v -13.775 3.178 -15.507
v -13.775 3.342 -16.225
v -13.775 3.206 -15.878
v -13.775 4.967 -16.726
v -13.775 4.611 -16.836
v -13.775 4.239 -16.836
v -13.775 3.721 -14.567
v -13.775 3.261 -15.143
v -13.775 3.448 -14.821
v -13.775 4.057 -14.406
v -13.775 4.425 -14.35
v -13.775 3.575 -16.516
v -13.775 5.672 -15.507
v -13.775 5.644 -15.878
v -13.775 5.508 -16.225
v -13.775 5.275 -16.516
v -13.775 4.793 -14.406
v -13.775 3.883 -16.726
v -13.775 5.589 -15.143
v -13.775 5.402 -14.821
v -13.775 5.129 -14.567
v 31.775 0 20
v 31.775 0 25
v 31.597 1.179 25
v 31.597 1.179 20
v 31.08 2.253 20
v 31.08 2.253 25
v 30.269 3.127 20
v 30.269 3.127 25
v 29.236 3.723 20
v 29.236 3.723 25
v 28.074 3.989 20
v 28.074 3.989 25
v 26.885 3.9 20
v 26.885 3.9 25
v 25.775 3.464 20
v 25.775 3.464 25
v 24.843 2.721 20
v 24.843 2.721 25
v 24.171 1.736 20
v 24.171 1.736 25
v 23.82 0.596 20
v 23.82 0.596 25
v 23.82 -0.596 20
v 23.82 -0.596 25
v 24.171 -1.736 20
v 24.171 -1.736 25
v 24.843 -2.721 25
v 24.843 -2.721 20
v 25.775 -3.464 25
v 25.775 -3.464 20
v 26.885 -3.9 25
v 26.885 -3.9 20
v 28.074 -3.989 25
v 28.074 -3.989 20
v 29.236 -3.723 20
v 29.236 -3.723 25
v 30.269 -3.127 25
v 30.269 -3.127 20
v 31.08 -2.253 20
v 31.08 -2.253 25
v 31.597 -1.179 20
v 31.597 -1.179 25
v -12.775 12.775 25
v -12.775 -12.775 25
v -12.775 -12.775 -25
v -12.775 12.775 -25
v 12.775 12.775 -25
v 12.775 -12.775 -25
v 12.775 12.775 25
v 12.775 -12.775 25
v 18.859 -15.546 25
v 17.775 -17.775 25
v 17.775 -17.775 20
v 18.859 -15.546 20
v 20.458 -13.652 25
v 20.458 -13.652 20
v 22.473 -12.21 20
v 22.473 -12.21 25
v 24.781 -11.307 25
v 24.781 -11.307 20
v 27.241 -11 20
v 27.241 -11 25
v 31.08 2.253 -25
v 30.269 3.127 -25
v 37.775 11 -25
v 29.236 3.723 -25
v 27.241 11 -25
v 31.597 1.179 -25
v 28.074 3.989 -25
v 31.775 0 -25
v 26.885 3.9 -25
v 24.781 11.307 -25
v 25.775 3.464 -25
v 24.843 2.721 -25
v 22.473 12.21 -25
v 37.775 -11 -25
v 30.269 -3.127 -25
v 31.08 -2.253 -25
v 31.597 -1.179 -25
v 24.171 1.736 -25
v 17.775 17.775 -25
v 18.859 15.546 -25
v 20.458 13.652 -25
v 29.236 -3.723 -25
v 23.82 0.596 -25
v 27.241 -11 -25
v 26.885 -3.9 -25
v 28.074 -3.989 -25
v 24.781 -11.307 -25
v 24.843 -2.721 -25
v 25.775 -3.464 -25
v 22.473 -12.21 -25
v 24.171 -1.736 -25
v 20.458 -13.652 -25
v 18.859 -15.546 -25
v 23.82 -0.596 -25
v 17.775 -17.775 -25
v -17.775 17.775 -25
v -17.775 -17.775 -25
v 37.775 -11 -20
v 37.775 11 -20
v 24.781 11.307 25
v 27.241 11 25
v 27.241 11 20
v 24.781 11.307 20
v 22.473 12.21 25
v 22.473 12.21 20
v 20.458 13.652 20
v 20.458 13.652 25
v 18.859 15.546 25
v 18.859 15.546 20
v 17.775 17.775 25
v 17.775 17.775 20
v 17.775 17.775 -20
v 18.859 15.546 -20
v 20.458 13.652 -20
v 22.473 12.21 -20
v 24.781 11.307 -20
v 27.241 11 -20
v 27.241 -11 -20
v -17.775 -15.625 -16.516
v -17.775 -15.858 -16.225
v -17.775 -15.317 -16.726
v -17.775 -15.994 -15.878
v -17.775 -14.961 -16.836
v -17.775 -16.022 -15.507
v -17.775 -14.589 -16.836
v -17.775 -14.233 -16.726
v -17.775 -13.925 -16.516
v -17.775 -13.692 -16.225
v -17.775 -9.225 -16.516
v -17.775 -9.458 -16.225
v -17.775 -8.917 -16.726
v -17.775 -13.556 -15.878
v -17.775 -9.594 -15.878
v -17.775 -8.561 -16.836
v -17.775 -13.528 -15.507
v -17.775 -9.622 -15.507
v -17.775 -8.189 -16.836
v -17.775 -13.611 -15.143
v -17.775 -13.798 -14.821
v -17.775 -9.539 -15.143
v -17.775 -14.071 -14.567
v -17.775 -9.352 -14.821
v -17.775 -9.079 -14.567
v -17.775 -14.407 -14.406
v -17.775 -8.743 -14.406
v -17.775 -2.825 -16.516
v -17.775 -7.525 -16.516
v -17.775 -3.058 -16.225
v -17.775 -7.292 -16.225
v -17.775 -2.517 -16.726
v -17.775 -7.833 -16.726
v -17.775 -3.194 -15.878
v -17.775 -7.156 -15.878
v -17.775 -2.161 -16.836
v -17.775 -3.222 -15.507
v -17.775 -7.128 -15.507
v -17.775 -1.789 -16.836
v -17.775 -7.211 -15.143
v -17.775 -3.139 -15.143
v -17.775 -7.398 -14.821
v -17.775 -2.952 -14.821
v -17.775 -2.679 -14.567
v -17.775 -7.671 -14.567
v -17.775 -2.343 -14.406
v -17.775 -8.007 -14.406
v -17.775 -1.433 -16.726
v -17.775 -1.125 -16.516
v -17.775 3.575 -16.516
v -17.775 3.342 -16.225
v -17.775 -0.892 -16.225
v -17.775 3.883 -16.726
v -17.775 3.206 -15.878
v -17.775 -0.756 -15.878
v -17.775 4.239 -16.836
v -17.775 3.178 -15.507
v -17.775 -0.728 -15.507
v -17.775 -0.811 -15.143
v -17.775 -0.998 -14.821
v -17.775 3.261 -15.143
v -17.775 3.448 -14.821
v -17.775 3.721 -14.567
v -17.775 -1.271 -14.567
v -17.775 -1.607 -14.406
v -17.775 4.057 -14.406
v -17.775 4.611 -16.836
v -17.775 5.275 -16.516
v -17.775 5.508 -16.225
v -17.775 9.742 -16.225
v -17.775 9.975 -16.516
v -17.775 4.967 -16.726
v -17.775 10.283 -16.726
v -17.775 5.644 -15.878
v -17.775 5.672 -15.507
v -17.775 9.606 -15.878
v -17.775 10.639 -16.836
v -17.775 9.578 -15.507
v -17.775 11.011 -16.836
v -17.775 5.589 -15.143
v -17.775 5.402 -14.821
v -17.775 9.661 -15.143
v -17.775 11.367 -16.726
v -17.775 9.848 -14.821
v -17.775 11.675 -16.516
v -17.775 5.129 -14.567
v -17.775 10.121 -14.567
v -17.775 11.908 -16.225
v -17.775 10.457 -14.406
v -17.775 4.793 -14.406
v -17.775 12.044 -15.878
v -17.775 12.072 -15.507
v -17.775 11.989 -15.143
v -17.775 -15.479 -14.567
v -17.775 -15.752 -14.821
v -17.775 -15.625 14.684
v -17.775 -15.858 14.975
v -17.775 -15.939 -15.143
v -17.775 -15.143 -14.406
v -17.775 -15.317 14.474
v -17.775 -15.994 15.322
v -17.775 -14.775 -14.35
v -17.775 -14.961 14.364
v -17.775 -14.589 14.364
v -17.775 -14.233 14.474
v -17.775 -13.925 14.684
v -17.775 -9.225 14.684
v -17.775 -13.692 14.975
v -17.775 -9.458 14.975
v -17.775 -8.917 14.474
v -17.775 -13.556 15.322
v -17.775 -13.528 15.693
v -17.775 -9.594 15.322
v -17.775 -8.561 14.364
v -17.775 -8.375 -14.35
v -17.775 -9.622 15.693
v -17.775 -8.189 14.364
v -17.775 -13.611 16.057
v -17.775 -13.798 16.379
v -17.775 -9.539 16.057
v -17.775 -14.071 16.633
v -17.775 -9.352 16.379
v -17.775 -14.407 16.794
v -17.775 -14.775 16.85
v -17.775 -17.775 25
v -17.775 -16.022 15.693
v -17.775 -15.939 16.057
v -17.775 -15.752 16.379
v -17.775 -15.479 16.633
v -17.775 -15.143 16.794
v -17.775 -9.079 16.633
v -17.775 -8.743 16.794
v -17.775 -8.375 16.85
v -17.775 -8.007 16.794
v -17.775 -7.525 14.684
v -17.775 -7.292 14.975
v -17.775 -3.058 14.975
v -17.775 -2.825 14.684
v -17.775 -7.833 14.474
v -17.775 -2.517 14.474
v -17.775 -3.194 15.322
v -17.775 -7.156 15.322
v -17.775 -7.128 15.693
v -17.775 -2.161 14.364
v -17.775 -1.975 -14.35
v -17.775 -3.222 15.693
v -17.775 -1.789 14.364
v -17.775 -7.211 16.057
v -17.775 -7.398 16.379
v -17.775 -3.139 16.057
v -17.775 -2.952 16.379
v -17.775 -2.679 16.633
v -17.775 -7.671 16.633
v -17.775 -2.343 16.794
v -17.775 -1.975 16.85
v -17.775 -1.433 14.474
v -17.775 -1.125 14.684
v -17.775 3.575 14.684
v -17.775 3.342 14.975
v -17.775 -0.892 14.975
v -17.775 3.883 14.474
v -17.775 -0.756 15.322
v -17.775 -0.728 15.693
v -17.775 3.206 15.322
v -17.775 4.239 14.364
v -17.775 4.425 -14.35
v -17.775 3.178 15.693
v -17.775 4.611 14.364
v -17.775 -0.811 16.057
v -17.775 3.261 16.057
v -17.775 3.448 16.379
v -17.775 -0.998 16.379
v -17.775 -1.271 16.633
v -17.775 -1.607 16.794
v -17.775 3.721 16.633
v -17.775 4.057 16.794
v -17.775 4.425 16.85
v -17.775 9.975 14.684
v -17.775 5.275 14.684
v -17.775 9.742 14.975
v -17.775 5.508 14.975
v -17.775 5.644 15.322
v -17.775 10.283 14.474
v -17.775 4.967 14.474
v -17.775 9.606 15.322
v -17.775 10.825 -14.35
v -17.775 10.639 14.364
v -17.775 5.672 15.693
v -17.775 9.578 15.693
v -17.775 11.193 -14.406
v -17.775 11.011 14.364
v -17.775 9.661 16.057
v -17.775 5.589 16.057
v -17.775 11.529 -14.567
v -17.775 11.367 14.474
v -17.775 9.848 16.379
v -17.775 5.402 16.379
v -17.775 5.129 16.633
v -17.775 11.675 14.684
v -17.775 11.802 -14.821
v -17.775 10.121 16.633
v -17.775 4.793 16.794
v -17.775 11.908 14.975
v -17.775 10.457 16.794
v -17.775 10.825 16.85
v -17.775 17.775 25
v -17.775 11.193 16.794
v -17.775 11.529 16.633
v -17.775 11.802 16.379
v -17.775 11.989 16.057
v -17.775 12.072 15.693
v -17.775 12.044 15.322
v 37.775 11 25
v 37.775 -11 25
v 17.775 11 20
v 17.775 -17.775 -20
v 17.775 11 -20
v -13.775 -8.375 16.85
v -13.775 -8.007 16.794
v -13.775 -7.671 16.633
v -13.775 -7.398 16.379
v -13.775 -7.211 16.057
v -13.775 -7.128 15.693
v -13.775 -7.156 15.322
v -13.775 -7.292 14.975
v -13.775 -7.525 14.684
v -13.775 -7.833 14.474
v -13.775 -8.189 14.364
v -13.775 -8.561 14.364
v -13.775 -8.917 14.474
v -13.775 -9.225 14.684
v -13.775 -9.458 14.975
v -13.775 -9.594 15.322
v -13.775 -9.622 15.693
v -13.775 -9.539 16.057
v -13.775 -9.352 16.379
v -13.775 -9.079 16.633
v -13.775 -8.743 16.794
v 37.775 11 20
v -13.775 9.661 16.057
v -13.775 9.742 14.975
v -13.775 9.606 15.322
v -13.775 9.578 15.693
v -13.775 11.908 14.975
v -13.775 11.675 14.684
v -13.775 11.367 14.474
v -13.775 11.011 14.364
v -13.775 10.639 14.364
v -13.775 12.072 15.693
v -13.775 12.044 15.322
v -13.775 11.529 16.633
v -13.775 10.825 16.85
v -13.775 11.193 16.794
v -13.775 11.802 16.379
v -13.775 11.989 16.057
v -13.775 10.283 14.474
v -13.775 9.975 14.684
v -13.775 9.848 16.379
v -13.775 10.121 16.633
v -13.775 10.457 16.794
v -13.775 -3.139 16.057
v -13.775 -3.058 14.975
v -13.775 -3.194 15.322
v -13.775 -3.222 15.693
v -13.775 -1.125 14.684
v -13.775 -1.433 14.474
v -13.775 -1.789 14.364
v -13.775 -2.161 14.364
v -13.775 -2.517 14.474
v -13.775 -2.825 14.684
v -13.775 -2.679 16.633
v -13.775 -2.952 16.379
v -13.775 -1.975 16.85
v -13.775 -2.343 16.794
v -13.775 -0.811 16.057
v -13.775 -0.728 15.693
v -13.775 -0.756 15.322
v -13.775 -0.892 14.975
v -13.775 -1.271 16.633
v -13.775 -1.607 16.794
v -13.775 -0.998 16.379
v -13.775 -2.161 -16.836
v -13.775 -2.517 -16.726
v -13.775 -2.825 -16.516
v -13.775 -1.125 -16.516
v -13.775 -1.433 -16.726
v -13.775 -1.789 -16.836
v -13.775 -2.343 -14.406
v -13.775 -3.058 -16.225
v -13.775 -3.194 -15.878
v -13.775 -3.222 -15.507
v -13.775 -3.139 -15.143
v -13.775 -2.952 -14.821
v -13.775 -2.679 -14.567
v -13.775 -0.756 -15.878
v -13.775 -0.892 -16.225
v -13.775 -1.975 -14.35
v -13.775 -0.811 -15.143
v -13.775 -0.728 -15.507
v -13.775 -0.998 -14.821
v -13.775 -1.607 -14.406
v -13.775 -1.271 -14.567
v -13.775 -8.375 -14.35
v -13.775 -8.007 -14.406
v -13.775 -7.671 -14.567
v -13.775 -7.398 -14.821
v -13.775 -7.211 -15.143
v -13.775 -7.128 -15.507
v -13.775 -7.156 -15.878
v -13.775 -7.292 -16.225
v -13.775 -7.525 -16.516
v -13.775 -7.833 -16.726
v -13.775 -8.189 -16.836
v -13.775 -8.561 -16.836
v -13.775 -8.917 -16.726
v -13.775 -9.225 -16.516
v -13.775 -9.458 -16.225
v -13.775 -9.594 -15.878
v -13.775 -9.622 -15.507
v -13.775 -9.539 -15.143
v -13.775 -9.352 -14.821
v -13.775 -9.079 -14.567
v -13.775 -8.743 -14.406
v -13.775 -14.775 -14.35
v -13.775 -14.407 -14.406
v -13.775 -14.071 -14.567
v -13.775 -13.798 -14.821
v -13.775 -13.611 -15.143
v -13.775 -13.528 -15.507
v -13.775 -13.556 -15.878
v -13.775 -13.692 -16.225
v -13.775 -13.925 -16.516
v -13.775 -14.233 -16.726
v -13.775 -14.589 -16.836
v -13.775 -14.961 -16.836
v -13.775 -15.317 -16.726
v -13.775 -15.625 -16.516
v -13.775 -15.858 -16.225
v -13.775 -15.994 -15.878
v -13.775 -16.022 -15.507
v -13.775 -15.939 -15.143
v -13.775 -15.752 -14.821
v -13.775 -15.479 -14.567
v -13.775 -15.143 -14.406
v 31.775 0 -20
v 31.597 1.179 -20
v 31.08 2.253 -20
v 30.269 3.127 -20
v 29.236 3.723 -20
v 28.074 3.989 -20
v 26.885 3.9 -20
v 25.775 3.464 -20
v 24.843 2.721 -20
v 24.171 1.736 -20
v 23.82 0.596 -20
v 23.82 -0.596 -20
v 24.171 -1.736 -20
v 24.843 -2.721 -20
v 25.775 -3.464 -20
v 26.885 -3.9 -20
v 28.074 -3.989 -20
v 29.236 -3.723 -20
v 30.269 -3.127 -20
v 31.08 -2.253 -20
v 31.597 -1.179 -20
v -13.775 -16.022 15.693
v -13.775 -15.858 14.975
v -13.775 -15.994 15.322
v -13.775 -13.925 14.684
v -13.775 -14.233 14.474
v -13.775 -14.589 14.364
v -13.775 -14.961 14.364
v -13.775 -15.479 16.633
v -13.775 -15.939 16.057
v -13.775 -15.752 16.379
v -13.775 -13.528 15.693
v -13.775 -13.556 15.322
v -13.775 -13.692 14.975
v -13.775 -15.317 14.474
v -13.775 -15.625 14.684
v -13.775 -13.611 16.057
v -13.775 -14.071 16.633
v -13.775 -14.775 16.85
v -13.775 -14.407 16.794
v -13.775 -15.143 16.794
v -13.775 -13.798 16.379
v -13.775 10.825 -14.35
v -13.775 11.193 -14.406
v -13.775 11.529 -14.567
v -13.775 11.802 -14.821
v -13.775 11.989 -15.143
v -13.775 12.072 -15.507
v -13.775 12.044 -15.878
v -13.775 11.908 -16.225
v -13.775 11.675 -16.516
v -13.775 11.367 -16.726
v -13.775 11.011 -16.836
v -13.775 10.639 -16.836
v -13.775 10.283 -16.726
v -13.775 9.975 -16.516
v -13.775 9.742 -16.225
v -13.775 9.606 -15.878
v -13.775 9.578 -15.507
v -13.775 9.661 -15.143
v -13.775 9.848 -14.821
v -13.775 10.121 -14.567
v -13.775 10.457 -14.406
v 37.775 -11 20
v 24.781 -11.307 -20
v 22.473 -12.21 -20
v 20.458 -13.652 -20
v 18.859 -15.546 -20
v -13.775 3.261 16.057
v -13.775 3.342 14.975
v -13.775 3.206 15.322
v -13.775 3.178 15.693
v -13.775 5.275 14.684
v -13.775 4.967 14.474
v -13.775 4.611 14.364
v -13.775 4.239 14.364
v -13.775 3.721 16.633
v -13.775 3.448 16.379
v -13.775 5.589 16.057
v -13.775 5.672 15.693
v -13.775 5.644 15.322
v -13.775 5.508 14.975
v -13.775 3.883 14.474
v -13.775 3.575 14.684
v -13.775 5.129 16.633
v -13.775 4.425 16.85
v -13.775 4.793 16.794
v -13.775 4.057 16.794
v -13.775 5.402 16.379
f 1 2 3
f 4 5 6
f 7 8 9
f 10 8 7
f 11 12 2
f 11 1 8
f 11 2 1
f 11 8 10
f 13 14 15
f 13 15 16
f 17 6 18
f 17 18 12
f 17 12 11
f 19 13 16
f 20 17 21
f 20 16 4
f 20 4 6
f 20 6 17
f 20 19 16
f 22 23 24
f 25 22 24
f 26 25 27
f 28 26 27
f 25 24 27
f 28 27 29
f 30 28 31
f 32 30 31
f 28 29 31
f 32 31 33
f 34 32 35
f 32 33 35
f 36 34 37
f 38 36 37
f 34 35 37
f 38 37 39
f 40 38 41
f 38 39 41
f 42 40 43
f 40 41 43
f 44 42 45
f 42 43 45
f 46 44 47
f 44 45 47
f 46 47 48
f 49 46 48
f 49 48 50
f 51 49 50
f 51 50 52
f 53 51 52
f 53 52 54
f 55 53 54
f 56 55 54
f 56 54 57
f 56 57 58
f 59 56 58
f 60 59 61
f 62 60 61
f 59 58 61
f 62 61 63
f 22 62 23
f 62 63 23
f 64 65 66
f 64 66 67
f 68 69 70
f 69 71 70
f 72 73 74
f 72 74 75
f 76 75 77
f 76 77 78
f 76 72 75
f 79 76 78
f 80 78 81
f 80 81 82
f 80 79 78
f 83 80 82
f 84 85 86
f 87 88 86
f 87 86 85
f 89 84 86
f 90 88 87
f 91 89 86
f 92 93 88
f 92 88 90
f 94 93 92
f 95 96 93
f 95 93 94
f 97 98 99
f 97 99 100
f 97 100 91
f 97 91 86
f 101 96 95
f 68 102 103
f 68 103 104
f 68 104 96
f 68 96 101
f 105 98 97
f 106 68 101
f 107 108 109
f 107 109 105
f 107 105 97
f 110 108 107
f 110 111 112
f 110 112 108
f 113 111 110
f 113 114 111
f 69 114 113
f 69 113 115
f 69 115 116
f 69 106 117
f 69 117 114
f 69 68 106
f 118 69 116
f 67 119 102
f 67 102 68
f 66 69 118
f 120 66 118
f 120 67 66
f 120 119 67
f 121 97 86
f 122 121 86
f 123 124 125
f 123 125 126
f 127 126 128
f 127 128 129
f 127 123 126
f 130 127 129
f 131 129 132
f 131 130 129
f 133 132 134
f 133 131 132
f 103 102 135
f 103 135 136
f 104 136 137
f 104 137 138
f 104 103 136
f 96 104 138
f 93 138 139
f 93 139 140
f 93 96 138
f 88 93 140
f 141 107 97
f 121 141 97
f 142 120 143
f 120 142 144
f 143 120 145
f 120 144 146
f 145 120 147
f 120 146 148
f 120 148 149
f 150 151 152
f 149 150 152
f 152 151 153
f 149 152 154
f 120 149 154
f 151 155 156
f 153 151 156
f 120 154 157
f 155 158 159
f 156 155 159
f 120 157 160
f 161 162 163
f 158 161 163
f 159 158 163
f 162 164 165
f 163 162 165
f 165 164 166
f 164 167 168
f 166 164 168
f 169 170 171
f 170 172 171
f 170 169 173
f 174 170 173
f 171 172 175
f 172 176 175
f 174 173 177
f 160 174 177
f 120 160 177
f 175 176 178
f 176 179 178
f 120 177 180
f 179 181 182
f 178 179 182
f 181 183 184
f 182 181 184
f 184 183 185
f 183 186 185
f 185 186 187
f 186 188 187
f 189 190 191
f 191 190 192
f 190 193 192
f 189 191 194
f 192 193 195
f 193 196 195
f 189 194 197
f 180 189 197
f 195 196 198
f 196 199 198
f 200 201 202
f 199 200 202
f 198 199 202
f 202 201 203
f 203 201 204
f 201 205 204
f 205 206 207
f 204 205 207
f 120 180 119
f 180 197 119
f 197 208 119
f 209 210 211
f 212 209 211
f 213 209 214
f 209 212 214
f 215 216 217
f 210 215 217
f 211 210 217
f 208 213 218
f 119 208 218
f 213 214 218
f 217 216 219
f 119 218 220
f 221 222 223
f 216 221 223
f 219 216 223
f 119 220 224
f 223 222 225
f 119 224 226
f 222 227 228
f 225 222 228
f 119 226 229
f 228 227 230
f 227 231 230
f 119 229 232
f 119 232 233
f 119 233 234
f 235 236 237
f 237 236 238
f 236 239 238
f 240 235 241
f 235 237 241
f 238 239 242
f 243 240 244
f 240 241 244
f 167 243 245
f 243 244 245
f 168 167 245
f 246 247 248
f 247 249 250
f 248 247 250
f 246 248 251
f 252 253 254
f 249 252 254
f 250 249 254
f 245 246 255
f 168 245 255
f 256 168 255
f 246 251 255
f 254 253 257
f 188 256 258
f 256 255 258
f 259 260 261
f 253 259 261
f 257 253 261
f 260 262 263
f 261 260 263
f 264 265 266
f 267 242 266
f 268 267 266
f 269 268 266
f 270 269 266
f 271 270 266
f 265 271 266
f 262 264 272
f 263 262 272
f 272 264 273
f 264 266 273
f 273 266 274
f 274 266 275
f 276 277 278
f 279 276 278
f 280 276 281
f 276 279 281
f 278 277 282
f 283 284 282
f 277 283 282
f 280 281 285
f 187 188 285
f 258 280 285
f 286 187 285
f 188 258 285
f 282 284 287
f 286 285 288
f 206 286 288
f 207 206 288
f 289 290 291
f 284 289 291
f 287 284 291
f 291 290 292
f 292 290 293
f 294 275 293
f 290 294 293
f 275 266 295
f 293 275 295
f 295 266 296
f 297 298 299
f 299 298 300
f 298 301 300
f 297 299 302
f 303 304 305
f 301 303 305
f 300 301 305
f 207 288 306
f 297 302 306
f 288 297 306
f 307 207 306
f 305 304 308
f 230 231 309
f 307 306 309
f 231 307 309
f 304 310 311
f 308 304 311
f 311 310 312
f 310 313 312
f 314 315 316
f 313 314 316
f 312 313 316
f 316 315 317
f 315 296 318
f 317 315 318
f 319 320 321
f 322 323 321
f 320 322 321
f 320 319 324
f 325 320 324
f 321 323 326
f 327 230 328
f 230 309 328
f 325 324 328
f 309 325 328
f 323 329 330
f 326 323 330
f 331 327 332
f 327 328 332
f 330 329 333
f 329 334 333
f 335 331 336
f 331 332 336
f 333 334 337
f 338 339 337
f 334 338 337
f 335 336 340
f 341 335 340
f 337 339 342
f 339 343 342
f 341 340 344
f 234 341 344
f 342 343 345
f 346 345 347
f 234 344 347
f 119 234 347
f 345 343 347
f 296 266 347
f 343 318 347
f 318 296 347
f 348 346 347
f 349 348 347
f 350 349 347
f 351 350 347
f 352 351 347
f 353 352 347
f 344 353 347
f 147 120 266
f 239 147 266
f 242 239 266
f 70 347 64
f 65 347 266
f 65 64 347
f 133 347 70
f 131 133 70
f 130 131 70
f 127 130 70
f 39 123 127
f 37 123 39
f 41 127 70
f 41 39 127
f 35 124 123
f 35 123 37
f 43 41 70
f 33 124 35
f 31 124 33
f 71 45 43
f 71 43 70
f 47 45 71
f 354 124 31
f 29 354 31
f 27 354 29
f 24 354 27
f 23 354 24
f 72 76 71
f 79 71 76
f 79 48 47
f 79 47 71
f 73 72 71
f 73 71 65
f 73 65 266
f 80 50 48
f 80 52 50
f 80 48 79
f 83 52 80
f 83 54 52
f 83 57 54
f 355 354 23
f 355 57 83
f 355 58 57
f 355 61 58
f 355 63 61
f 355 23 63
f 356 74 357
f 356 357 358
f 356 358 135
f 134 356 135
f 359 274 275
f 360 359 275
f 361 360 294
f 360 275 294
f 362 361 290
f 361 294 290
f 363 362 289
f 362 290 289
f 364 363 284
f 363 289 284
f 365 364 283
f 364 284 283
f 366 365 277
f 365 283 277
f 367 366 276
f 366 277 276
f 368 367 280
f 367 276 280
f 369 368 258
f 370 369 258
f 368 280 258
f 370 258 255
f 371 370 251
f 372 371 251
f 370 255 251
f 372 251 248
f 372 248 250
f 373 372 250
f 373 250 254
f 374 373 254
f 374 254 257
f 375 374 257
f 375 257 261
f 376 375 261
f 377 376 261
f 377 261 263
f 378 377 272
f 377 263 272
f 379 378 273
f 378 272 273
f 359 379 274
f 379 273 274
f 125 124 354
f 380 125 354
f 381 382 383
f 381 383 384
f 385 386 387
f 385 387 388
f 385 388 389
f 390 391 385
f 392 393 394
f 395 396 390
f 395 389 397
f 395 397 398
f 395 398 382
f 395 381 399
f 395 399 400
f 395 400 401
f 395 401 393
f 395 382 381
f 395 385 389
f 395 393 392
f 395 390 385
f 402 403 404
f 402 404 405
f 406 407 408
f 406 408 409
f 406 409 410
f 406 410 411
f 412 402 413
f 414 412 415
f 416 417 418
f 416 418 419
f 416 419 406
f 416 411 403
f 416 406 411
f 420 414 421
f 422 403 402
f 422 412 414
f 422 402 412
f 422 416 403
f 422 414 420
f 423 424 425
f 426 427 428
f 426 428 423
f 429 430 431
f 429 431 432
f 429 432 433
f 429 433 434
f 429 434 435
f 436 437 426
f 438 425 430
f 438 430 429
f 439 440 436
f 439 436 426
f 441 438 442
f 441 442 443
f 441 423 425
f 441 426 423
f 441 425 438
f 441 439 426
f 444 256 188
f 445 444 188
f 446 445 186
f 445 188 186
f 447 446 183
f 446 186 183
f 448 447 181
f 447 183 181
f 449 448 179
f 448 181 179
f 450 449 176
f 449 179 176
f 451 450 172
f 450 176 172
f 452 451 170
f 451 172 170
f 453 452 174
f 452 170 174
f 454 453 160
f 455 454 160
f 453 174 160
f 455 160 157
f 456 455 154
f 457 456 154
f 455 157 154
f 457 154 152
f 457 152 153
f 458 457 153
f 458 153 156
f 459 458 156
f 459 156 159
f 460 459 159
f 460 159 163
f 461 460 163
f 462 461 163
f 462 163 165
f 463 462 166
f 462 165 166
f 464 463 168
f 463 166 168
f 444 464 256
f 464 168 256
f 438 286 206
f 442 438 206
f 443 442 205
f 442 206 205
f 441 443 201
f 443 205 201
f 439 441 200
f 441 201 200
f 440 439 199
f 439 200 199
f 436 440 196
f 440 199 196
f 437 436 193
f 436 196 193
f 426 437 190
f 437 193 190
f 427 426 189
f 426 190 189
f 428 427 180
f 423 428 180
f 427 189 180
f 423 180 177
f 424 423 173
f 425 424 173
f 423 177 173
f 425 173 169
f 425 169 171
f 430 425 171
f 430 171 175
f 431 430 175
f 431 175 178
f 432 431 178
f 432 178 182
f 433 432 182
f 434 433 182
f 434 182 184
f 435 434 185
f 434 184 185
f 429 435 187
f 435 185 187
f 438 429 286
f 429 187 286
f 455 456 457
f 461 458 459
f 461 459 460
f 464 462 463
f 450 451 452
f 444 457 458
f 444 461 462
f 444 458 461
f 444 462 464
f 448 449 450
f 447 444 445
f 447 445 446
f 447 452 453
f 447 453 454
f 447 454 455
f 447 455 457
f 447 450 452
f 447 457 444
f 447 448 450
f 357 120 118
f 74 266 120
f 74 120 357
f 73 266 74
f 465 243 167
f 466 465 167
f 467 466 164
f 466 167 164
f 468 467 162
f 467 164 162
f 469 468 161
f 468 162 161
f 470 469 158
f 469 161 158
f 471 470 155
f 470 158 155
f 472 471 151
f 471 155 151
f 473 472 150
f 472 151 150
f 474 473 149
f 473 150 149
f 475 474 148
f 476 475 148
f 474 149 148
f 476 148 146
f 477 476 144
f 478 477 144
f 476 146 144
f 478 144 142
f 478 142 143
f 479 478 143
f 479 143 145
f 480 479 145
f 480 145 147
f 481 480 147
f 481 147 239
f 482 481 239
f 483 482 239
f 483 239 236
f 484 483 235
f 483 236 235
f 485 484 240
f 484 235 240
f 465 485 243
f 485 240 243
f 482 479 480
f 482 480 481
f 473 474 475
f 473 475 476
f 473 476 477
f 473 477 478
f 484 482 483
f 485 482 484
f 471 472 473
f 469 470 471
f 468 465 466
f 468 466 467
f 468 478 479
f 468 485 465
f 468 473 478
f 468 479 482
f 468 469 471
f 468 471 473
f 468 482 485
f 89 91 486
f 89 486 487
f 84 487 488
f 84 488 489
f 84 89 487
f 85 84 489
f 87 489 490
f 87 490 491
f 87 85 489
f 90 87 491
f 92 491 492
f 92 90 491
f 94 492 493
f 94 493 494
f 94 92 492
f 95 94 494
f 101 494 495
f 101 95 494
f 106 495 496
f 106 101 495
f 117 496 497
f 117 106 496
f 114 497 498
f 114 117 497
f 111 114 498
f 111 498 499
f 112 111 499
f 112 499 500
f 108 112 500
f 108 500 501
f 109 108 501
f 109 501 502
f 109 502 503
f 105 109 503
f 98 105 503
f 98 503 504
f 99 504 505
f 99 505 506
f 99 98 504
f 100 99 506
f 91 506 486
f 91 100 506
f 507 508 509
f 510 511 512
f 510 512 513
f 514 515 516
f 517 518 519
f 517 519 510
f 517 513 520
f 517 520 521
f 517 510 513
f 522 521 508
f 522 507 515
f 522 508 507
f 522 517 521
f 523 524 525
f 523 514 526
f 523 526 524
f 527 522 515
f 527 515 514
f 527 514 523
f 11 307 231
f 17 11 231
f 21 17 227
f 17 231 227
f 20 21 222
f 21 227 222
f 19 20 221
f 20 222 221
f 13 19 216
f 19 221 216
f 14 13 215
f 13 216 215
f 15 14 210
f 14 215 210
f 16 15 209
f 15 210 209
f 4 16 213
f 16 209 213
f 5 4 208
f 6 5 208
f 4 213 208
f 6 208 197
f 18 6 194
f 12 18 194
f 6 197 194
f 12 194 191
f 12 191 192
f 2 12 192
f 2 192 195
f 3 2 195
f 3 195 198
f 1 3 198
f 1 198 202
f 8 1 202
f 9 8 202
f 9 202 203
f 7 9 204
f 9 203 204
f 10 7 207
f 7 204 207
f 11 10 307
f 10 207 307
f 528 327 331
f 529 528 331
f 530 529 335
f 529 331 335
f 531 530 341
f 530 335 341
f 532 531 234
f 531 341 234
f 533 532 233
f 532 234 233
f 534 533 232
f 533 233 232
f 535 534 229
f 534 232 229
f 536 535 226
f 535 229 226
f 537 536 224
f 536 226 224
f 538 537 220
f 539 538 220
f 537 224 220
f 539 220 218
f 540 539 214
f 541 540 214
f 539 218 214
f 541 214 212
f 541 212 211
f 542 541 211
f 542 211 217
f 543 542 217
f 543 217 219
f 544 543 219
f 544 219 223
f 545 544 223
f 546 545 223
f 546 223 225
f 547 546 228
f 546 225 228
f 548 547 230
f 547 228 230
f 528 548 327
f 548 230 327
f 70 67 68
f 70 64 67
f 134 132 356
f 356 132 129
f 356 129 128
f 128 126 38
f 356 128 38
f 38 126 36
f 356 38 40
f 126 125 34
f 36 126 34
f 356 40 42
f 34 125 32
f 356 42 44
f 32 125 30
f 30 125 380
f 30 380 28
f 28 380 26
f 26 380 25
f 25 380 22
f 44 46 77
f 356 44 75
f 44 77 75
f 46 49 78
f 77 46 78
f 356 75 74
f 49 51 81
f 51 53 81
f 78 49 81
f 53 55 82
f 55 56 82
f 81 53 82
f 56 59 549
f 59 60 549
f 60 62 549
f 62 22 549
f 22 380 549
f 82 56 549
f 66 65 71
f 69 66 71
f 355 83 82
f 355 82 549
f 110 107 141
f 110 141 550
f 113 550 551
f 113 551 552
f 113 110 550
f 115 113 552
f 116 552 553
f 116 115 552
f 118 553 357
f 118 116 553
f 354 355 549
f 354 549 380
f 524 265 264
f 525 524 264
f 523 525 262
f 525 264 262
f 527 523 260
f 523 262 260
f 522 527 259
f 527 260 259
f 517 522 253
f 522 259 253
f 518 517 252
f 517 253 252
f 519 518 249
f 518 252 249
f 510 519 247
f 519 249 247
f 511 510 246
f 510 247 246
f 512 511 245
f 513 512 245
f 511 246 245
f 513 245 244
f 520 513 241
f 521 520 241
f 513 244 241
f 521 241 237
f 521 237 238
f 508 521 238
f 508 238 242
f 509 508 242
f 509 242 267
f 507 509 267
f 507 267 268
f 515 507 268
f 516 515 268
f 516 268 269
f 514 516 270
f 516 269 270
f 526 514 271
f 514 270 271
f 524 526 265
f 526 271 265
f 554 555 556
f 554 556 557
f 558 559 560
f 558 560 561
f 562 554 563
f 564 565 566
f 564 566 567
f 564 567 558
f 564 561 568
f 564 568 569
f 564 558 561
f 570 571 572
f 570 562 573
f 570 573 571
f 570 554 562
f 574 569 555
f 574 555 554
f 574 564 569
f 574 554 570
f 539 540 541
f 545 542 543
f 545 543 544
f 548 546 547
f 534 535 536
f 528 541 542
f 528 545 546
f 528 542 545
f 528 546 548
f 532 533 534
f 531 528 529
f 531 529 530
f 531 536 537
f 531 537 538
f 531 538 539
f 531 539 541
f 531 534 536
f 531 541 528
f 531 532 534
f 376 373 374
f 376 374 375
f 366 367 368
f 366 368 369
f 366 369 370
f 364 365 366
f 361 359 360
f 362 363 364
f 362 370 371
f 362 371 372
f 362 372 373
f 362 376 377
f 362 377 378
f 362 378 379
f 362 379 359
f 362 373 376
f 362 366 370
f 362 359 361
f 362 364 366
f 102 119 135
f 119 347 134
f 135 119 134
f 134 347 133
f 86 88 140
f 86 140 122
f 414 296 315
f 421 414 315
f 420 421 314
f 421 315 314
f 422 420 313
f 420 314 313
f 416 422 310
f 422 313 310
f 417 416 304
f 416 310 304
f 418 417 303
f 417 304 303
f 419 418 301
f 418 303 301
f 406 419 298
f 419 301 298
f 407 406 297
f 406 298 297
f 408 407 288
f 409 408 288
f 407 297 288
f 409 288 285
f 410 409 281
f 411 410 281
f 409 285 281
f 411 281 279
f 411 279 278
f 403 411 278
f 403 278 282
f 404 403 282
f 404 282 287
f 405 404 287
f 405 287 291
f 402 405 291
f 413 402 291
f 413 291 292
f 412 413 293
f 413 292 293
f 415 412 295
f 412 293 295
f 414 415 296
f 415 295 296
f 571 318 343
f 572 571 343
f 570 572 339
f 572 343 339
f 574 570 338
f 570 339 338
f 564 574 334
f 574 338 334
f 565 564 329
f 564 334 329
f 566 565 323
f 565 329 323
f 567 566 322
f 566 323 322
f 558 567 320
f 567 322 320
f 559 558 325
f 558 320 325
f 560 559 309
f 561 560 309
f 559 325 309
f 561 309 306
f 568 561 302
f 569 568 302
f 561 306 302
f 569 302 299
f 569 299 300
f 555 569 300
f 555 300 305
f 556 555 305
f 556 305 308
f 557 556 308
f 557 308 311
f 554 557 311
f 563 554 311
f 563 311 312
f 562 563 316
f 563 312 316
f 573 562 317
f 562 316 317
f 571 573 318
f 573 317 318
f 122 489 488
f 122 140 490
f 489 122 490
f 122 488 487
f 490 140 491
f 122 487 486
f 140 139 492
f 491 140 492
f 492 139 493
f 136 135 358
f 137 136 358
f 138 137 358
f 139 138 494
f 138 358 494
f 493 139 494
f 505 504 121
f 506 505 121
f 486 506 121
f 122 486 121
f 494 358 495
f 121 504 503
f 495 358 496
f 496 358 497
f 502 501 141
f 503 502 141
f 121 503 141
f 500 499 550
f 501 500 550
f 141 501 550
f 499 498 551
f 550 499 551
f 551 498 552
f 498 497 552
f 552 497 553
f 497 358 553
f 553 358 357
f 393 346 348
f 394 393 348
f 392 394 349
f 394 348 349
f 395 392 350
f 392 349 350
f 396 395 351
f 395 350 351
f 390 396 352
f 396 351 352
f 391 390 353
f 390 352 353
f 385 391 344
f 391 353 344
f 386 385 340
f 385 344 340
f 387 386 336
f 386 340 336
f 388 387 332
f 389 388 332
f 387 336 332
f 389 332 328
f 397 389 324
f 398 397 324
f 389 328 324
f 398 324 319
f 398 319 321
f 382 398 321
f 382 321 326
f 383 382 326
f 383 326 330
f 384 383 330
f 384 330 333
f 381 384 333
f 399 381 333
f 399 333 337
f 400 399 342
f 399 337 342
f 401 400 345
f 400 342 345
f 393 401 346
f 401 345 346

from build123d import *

# Parameters (mm, degrees)
SKETCH1_W            = 35.55
SKETCH1_H            = 35.55
SKETCH1_W_2          = 25.55
SKETCH1_H_2          = 25.55
BOSS_EXTRUDE1_DEPTH  = 25
SKETCH2_R            = 1.25
CUT_EXTRUDE1_DEPTH   = 4
SKETCH3_W            = 20
SKETCH3_H            = 22
SKETCH3_R            = 4
BOSS_EXTRUDE2_DEPTH  = 5
FILLET1_R            = 10
FILLET1_OF_MIRROR2_R = 10


with BuildPart() as part:
    # Sketch1 → Boss-Extrude1 (new, symmetric)
    with BuildSketch(Plane.XY):
        Rectangle(SKETCH1_W, SKETCH1_H)
        Rectangle(SKETCH1_W_2, SKETCH1_H_2, mode=Mode.SUBTRACT)
    extrude(amount=BOSS_EXTRUDE1_DEPTH, both=True)

    # Sketch2 → Cut-Extrude1 (cut, symmetric)
    with BuildSketch(Plane.ZY.offset(17.775)):
        with Locations((-15.6, -14.775)):
            Circle(SKETCH2_R)
        with Locations((15.6, -14.775)):
            Circle(SKETCH2_R)
        with Locations((-15.6, -8.375)):
            Circle(SKETCH2_R)
        with Locations((15.6, -8.375)):
            Circle(SKETCH2_R)
        with Locations((-15.6, -1.975)):
            Circle(SKETCH2_R)
        with Locations((15.6, -1.975)):
            Circle(SKETCH2_R)
        with Locations((-15.6, 4.425)):
            Circle(SKETCH2_R)
        with Locations((15.6, 4.425)):
            Circle(SKETCH2_R)
        with Locations((-15.6, 10.825)):
            Circle(SKETCH2_R)
        with Locations((15.6, 10.825)):
            Circle(SKETCH2_R)
    extrude(amount=CUT_EXTRUDE1_DEPTH, both=True, mode=Mode.SUBTRACT)

    # Sketch3 → Boss-Extrude2 (add)
    with BuildSketch(Plane.XY.offset(25)):
        with Locations((27.775, 0)):
            Rectangle(SKETCH3_W, SKETCH3_H)
        with Locations((27.775, 0)):
            Circle(SKETCH3_R, mode=Mode.SUBTRACT)
    boss_extrude2 = extrude(amount=-BOSS_EXTRUDE2_DEPTH)

    # Fillet1
    # the kernel refuses this fillet: 10 mm, written as the material it adds along each edge
    with BuildSketch(Plane(origin=(17.775, -11, 25), x_dir=(0, -1, 0), z_dir=(0, 0, -1))) as fillet1_piece_1:
        with BuildLine():
            CenterArc((10, -9.465694639), FILLET1_R, 108.814181852, 71.185818148)
            Line((0, -9.465694639), (-0.2, -9.465694639))
            Line((-0.2, -9.465694639), (-0.2, 0))
            Line((-0.2, 0), (0, 0.2))
            ThreePointArc((0, 0.2), (3.3875, 0.2), (6.7105, 0.189313893))
            Line((6.7105, 0.189313893), (6.775, 0))
        make_face()
    extrude(amount=5)
    with BuildSketch(Plane(origin=(17.775, 11, 25), x_dir=(0, 1, 0), z_dir=(0, 0, -1))) as fillet1_piece_2:
        with BuildLine():
            CenterArc((10, 9.465694639), FILLET1_R, 180, 71.185818148)
            Line((0, 9.465694639), (-0.2, 9.465694639))
            Line((-0.2, 9.465694639), (-0.2, 0))
            Line((-0.2, 0), (0, -0.2))
            ThreePointArc((0, -0.2), (3.3875, -0.2), (6.7105, -0.189313893))
            Line((6.7105, -0.189313893), (6.775, 0))
        make_face()
    extrude(amount=5)

    # Mirror2: Boss-Extrude2 across plane
    add(boss_extrude2.mirror(Plane.XY))

    # Fillet1 of Mirror2
    # the kernel refuses this fillet: 10 mm, written as the material it adds along each edge
    with BuildSketch(Plane(origin=(17.775, -11, -25), x_dir=(0, -1, 0), z_dir=(0, 0, 1))) as fillet1_of_mirror2_piece_1:
        with BuildLine():
            CenterArc((10, 9.465694639), FILLET1_OF_MIRROR2_R, 180, 71.185818148)
            Line((0, 9.465694639), (-0.2, 9.465694639))
            Line((-0.2, 9.465694639), (-0.2, 0))
            Line((-0.2, 0), (0, -0.2))
            ThreePointArc((0, -0.2), (3.3875, -0.2), (6.7105, -0.189313893))
            Line((6.7105, -0.189313893), (6.775, 0))
        make_face()
    extrude(amount=5)
    with BuildSketch(Plane(origin=(17.775, 11, -25), x_dir=(0, 1, 0), z_dir=(0, 0, 1))) as fillet1_of_mirror2_piece_2:
        with BuildLine():
            CenterArc((10, -9.465694639), FILLET1_OF_MIRROR2_R, 108.814181852, 71.185818148)
            Line((0, -9.465694639), (-0.2, -9.465694639))
            Line((-0.2, -9.465694639), (-0.2, 0))
            Line((-0.2, 0), (0, 0.2))
            ThreePointArc((0, 0.2), (3.3875, 0.2), (6.7105, 0.189313893))
            Line((6.7105, 0.189313893), (6.775, 0))
        make_face()
    extrude(amount=5)


solid = part.part
